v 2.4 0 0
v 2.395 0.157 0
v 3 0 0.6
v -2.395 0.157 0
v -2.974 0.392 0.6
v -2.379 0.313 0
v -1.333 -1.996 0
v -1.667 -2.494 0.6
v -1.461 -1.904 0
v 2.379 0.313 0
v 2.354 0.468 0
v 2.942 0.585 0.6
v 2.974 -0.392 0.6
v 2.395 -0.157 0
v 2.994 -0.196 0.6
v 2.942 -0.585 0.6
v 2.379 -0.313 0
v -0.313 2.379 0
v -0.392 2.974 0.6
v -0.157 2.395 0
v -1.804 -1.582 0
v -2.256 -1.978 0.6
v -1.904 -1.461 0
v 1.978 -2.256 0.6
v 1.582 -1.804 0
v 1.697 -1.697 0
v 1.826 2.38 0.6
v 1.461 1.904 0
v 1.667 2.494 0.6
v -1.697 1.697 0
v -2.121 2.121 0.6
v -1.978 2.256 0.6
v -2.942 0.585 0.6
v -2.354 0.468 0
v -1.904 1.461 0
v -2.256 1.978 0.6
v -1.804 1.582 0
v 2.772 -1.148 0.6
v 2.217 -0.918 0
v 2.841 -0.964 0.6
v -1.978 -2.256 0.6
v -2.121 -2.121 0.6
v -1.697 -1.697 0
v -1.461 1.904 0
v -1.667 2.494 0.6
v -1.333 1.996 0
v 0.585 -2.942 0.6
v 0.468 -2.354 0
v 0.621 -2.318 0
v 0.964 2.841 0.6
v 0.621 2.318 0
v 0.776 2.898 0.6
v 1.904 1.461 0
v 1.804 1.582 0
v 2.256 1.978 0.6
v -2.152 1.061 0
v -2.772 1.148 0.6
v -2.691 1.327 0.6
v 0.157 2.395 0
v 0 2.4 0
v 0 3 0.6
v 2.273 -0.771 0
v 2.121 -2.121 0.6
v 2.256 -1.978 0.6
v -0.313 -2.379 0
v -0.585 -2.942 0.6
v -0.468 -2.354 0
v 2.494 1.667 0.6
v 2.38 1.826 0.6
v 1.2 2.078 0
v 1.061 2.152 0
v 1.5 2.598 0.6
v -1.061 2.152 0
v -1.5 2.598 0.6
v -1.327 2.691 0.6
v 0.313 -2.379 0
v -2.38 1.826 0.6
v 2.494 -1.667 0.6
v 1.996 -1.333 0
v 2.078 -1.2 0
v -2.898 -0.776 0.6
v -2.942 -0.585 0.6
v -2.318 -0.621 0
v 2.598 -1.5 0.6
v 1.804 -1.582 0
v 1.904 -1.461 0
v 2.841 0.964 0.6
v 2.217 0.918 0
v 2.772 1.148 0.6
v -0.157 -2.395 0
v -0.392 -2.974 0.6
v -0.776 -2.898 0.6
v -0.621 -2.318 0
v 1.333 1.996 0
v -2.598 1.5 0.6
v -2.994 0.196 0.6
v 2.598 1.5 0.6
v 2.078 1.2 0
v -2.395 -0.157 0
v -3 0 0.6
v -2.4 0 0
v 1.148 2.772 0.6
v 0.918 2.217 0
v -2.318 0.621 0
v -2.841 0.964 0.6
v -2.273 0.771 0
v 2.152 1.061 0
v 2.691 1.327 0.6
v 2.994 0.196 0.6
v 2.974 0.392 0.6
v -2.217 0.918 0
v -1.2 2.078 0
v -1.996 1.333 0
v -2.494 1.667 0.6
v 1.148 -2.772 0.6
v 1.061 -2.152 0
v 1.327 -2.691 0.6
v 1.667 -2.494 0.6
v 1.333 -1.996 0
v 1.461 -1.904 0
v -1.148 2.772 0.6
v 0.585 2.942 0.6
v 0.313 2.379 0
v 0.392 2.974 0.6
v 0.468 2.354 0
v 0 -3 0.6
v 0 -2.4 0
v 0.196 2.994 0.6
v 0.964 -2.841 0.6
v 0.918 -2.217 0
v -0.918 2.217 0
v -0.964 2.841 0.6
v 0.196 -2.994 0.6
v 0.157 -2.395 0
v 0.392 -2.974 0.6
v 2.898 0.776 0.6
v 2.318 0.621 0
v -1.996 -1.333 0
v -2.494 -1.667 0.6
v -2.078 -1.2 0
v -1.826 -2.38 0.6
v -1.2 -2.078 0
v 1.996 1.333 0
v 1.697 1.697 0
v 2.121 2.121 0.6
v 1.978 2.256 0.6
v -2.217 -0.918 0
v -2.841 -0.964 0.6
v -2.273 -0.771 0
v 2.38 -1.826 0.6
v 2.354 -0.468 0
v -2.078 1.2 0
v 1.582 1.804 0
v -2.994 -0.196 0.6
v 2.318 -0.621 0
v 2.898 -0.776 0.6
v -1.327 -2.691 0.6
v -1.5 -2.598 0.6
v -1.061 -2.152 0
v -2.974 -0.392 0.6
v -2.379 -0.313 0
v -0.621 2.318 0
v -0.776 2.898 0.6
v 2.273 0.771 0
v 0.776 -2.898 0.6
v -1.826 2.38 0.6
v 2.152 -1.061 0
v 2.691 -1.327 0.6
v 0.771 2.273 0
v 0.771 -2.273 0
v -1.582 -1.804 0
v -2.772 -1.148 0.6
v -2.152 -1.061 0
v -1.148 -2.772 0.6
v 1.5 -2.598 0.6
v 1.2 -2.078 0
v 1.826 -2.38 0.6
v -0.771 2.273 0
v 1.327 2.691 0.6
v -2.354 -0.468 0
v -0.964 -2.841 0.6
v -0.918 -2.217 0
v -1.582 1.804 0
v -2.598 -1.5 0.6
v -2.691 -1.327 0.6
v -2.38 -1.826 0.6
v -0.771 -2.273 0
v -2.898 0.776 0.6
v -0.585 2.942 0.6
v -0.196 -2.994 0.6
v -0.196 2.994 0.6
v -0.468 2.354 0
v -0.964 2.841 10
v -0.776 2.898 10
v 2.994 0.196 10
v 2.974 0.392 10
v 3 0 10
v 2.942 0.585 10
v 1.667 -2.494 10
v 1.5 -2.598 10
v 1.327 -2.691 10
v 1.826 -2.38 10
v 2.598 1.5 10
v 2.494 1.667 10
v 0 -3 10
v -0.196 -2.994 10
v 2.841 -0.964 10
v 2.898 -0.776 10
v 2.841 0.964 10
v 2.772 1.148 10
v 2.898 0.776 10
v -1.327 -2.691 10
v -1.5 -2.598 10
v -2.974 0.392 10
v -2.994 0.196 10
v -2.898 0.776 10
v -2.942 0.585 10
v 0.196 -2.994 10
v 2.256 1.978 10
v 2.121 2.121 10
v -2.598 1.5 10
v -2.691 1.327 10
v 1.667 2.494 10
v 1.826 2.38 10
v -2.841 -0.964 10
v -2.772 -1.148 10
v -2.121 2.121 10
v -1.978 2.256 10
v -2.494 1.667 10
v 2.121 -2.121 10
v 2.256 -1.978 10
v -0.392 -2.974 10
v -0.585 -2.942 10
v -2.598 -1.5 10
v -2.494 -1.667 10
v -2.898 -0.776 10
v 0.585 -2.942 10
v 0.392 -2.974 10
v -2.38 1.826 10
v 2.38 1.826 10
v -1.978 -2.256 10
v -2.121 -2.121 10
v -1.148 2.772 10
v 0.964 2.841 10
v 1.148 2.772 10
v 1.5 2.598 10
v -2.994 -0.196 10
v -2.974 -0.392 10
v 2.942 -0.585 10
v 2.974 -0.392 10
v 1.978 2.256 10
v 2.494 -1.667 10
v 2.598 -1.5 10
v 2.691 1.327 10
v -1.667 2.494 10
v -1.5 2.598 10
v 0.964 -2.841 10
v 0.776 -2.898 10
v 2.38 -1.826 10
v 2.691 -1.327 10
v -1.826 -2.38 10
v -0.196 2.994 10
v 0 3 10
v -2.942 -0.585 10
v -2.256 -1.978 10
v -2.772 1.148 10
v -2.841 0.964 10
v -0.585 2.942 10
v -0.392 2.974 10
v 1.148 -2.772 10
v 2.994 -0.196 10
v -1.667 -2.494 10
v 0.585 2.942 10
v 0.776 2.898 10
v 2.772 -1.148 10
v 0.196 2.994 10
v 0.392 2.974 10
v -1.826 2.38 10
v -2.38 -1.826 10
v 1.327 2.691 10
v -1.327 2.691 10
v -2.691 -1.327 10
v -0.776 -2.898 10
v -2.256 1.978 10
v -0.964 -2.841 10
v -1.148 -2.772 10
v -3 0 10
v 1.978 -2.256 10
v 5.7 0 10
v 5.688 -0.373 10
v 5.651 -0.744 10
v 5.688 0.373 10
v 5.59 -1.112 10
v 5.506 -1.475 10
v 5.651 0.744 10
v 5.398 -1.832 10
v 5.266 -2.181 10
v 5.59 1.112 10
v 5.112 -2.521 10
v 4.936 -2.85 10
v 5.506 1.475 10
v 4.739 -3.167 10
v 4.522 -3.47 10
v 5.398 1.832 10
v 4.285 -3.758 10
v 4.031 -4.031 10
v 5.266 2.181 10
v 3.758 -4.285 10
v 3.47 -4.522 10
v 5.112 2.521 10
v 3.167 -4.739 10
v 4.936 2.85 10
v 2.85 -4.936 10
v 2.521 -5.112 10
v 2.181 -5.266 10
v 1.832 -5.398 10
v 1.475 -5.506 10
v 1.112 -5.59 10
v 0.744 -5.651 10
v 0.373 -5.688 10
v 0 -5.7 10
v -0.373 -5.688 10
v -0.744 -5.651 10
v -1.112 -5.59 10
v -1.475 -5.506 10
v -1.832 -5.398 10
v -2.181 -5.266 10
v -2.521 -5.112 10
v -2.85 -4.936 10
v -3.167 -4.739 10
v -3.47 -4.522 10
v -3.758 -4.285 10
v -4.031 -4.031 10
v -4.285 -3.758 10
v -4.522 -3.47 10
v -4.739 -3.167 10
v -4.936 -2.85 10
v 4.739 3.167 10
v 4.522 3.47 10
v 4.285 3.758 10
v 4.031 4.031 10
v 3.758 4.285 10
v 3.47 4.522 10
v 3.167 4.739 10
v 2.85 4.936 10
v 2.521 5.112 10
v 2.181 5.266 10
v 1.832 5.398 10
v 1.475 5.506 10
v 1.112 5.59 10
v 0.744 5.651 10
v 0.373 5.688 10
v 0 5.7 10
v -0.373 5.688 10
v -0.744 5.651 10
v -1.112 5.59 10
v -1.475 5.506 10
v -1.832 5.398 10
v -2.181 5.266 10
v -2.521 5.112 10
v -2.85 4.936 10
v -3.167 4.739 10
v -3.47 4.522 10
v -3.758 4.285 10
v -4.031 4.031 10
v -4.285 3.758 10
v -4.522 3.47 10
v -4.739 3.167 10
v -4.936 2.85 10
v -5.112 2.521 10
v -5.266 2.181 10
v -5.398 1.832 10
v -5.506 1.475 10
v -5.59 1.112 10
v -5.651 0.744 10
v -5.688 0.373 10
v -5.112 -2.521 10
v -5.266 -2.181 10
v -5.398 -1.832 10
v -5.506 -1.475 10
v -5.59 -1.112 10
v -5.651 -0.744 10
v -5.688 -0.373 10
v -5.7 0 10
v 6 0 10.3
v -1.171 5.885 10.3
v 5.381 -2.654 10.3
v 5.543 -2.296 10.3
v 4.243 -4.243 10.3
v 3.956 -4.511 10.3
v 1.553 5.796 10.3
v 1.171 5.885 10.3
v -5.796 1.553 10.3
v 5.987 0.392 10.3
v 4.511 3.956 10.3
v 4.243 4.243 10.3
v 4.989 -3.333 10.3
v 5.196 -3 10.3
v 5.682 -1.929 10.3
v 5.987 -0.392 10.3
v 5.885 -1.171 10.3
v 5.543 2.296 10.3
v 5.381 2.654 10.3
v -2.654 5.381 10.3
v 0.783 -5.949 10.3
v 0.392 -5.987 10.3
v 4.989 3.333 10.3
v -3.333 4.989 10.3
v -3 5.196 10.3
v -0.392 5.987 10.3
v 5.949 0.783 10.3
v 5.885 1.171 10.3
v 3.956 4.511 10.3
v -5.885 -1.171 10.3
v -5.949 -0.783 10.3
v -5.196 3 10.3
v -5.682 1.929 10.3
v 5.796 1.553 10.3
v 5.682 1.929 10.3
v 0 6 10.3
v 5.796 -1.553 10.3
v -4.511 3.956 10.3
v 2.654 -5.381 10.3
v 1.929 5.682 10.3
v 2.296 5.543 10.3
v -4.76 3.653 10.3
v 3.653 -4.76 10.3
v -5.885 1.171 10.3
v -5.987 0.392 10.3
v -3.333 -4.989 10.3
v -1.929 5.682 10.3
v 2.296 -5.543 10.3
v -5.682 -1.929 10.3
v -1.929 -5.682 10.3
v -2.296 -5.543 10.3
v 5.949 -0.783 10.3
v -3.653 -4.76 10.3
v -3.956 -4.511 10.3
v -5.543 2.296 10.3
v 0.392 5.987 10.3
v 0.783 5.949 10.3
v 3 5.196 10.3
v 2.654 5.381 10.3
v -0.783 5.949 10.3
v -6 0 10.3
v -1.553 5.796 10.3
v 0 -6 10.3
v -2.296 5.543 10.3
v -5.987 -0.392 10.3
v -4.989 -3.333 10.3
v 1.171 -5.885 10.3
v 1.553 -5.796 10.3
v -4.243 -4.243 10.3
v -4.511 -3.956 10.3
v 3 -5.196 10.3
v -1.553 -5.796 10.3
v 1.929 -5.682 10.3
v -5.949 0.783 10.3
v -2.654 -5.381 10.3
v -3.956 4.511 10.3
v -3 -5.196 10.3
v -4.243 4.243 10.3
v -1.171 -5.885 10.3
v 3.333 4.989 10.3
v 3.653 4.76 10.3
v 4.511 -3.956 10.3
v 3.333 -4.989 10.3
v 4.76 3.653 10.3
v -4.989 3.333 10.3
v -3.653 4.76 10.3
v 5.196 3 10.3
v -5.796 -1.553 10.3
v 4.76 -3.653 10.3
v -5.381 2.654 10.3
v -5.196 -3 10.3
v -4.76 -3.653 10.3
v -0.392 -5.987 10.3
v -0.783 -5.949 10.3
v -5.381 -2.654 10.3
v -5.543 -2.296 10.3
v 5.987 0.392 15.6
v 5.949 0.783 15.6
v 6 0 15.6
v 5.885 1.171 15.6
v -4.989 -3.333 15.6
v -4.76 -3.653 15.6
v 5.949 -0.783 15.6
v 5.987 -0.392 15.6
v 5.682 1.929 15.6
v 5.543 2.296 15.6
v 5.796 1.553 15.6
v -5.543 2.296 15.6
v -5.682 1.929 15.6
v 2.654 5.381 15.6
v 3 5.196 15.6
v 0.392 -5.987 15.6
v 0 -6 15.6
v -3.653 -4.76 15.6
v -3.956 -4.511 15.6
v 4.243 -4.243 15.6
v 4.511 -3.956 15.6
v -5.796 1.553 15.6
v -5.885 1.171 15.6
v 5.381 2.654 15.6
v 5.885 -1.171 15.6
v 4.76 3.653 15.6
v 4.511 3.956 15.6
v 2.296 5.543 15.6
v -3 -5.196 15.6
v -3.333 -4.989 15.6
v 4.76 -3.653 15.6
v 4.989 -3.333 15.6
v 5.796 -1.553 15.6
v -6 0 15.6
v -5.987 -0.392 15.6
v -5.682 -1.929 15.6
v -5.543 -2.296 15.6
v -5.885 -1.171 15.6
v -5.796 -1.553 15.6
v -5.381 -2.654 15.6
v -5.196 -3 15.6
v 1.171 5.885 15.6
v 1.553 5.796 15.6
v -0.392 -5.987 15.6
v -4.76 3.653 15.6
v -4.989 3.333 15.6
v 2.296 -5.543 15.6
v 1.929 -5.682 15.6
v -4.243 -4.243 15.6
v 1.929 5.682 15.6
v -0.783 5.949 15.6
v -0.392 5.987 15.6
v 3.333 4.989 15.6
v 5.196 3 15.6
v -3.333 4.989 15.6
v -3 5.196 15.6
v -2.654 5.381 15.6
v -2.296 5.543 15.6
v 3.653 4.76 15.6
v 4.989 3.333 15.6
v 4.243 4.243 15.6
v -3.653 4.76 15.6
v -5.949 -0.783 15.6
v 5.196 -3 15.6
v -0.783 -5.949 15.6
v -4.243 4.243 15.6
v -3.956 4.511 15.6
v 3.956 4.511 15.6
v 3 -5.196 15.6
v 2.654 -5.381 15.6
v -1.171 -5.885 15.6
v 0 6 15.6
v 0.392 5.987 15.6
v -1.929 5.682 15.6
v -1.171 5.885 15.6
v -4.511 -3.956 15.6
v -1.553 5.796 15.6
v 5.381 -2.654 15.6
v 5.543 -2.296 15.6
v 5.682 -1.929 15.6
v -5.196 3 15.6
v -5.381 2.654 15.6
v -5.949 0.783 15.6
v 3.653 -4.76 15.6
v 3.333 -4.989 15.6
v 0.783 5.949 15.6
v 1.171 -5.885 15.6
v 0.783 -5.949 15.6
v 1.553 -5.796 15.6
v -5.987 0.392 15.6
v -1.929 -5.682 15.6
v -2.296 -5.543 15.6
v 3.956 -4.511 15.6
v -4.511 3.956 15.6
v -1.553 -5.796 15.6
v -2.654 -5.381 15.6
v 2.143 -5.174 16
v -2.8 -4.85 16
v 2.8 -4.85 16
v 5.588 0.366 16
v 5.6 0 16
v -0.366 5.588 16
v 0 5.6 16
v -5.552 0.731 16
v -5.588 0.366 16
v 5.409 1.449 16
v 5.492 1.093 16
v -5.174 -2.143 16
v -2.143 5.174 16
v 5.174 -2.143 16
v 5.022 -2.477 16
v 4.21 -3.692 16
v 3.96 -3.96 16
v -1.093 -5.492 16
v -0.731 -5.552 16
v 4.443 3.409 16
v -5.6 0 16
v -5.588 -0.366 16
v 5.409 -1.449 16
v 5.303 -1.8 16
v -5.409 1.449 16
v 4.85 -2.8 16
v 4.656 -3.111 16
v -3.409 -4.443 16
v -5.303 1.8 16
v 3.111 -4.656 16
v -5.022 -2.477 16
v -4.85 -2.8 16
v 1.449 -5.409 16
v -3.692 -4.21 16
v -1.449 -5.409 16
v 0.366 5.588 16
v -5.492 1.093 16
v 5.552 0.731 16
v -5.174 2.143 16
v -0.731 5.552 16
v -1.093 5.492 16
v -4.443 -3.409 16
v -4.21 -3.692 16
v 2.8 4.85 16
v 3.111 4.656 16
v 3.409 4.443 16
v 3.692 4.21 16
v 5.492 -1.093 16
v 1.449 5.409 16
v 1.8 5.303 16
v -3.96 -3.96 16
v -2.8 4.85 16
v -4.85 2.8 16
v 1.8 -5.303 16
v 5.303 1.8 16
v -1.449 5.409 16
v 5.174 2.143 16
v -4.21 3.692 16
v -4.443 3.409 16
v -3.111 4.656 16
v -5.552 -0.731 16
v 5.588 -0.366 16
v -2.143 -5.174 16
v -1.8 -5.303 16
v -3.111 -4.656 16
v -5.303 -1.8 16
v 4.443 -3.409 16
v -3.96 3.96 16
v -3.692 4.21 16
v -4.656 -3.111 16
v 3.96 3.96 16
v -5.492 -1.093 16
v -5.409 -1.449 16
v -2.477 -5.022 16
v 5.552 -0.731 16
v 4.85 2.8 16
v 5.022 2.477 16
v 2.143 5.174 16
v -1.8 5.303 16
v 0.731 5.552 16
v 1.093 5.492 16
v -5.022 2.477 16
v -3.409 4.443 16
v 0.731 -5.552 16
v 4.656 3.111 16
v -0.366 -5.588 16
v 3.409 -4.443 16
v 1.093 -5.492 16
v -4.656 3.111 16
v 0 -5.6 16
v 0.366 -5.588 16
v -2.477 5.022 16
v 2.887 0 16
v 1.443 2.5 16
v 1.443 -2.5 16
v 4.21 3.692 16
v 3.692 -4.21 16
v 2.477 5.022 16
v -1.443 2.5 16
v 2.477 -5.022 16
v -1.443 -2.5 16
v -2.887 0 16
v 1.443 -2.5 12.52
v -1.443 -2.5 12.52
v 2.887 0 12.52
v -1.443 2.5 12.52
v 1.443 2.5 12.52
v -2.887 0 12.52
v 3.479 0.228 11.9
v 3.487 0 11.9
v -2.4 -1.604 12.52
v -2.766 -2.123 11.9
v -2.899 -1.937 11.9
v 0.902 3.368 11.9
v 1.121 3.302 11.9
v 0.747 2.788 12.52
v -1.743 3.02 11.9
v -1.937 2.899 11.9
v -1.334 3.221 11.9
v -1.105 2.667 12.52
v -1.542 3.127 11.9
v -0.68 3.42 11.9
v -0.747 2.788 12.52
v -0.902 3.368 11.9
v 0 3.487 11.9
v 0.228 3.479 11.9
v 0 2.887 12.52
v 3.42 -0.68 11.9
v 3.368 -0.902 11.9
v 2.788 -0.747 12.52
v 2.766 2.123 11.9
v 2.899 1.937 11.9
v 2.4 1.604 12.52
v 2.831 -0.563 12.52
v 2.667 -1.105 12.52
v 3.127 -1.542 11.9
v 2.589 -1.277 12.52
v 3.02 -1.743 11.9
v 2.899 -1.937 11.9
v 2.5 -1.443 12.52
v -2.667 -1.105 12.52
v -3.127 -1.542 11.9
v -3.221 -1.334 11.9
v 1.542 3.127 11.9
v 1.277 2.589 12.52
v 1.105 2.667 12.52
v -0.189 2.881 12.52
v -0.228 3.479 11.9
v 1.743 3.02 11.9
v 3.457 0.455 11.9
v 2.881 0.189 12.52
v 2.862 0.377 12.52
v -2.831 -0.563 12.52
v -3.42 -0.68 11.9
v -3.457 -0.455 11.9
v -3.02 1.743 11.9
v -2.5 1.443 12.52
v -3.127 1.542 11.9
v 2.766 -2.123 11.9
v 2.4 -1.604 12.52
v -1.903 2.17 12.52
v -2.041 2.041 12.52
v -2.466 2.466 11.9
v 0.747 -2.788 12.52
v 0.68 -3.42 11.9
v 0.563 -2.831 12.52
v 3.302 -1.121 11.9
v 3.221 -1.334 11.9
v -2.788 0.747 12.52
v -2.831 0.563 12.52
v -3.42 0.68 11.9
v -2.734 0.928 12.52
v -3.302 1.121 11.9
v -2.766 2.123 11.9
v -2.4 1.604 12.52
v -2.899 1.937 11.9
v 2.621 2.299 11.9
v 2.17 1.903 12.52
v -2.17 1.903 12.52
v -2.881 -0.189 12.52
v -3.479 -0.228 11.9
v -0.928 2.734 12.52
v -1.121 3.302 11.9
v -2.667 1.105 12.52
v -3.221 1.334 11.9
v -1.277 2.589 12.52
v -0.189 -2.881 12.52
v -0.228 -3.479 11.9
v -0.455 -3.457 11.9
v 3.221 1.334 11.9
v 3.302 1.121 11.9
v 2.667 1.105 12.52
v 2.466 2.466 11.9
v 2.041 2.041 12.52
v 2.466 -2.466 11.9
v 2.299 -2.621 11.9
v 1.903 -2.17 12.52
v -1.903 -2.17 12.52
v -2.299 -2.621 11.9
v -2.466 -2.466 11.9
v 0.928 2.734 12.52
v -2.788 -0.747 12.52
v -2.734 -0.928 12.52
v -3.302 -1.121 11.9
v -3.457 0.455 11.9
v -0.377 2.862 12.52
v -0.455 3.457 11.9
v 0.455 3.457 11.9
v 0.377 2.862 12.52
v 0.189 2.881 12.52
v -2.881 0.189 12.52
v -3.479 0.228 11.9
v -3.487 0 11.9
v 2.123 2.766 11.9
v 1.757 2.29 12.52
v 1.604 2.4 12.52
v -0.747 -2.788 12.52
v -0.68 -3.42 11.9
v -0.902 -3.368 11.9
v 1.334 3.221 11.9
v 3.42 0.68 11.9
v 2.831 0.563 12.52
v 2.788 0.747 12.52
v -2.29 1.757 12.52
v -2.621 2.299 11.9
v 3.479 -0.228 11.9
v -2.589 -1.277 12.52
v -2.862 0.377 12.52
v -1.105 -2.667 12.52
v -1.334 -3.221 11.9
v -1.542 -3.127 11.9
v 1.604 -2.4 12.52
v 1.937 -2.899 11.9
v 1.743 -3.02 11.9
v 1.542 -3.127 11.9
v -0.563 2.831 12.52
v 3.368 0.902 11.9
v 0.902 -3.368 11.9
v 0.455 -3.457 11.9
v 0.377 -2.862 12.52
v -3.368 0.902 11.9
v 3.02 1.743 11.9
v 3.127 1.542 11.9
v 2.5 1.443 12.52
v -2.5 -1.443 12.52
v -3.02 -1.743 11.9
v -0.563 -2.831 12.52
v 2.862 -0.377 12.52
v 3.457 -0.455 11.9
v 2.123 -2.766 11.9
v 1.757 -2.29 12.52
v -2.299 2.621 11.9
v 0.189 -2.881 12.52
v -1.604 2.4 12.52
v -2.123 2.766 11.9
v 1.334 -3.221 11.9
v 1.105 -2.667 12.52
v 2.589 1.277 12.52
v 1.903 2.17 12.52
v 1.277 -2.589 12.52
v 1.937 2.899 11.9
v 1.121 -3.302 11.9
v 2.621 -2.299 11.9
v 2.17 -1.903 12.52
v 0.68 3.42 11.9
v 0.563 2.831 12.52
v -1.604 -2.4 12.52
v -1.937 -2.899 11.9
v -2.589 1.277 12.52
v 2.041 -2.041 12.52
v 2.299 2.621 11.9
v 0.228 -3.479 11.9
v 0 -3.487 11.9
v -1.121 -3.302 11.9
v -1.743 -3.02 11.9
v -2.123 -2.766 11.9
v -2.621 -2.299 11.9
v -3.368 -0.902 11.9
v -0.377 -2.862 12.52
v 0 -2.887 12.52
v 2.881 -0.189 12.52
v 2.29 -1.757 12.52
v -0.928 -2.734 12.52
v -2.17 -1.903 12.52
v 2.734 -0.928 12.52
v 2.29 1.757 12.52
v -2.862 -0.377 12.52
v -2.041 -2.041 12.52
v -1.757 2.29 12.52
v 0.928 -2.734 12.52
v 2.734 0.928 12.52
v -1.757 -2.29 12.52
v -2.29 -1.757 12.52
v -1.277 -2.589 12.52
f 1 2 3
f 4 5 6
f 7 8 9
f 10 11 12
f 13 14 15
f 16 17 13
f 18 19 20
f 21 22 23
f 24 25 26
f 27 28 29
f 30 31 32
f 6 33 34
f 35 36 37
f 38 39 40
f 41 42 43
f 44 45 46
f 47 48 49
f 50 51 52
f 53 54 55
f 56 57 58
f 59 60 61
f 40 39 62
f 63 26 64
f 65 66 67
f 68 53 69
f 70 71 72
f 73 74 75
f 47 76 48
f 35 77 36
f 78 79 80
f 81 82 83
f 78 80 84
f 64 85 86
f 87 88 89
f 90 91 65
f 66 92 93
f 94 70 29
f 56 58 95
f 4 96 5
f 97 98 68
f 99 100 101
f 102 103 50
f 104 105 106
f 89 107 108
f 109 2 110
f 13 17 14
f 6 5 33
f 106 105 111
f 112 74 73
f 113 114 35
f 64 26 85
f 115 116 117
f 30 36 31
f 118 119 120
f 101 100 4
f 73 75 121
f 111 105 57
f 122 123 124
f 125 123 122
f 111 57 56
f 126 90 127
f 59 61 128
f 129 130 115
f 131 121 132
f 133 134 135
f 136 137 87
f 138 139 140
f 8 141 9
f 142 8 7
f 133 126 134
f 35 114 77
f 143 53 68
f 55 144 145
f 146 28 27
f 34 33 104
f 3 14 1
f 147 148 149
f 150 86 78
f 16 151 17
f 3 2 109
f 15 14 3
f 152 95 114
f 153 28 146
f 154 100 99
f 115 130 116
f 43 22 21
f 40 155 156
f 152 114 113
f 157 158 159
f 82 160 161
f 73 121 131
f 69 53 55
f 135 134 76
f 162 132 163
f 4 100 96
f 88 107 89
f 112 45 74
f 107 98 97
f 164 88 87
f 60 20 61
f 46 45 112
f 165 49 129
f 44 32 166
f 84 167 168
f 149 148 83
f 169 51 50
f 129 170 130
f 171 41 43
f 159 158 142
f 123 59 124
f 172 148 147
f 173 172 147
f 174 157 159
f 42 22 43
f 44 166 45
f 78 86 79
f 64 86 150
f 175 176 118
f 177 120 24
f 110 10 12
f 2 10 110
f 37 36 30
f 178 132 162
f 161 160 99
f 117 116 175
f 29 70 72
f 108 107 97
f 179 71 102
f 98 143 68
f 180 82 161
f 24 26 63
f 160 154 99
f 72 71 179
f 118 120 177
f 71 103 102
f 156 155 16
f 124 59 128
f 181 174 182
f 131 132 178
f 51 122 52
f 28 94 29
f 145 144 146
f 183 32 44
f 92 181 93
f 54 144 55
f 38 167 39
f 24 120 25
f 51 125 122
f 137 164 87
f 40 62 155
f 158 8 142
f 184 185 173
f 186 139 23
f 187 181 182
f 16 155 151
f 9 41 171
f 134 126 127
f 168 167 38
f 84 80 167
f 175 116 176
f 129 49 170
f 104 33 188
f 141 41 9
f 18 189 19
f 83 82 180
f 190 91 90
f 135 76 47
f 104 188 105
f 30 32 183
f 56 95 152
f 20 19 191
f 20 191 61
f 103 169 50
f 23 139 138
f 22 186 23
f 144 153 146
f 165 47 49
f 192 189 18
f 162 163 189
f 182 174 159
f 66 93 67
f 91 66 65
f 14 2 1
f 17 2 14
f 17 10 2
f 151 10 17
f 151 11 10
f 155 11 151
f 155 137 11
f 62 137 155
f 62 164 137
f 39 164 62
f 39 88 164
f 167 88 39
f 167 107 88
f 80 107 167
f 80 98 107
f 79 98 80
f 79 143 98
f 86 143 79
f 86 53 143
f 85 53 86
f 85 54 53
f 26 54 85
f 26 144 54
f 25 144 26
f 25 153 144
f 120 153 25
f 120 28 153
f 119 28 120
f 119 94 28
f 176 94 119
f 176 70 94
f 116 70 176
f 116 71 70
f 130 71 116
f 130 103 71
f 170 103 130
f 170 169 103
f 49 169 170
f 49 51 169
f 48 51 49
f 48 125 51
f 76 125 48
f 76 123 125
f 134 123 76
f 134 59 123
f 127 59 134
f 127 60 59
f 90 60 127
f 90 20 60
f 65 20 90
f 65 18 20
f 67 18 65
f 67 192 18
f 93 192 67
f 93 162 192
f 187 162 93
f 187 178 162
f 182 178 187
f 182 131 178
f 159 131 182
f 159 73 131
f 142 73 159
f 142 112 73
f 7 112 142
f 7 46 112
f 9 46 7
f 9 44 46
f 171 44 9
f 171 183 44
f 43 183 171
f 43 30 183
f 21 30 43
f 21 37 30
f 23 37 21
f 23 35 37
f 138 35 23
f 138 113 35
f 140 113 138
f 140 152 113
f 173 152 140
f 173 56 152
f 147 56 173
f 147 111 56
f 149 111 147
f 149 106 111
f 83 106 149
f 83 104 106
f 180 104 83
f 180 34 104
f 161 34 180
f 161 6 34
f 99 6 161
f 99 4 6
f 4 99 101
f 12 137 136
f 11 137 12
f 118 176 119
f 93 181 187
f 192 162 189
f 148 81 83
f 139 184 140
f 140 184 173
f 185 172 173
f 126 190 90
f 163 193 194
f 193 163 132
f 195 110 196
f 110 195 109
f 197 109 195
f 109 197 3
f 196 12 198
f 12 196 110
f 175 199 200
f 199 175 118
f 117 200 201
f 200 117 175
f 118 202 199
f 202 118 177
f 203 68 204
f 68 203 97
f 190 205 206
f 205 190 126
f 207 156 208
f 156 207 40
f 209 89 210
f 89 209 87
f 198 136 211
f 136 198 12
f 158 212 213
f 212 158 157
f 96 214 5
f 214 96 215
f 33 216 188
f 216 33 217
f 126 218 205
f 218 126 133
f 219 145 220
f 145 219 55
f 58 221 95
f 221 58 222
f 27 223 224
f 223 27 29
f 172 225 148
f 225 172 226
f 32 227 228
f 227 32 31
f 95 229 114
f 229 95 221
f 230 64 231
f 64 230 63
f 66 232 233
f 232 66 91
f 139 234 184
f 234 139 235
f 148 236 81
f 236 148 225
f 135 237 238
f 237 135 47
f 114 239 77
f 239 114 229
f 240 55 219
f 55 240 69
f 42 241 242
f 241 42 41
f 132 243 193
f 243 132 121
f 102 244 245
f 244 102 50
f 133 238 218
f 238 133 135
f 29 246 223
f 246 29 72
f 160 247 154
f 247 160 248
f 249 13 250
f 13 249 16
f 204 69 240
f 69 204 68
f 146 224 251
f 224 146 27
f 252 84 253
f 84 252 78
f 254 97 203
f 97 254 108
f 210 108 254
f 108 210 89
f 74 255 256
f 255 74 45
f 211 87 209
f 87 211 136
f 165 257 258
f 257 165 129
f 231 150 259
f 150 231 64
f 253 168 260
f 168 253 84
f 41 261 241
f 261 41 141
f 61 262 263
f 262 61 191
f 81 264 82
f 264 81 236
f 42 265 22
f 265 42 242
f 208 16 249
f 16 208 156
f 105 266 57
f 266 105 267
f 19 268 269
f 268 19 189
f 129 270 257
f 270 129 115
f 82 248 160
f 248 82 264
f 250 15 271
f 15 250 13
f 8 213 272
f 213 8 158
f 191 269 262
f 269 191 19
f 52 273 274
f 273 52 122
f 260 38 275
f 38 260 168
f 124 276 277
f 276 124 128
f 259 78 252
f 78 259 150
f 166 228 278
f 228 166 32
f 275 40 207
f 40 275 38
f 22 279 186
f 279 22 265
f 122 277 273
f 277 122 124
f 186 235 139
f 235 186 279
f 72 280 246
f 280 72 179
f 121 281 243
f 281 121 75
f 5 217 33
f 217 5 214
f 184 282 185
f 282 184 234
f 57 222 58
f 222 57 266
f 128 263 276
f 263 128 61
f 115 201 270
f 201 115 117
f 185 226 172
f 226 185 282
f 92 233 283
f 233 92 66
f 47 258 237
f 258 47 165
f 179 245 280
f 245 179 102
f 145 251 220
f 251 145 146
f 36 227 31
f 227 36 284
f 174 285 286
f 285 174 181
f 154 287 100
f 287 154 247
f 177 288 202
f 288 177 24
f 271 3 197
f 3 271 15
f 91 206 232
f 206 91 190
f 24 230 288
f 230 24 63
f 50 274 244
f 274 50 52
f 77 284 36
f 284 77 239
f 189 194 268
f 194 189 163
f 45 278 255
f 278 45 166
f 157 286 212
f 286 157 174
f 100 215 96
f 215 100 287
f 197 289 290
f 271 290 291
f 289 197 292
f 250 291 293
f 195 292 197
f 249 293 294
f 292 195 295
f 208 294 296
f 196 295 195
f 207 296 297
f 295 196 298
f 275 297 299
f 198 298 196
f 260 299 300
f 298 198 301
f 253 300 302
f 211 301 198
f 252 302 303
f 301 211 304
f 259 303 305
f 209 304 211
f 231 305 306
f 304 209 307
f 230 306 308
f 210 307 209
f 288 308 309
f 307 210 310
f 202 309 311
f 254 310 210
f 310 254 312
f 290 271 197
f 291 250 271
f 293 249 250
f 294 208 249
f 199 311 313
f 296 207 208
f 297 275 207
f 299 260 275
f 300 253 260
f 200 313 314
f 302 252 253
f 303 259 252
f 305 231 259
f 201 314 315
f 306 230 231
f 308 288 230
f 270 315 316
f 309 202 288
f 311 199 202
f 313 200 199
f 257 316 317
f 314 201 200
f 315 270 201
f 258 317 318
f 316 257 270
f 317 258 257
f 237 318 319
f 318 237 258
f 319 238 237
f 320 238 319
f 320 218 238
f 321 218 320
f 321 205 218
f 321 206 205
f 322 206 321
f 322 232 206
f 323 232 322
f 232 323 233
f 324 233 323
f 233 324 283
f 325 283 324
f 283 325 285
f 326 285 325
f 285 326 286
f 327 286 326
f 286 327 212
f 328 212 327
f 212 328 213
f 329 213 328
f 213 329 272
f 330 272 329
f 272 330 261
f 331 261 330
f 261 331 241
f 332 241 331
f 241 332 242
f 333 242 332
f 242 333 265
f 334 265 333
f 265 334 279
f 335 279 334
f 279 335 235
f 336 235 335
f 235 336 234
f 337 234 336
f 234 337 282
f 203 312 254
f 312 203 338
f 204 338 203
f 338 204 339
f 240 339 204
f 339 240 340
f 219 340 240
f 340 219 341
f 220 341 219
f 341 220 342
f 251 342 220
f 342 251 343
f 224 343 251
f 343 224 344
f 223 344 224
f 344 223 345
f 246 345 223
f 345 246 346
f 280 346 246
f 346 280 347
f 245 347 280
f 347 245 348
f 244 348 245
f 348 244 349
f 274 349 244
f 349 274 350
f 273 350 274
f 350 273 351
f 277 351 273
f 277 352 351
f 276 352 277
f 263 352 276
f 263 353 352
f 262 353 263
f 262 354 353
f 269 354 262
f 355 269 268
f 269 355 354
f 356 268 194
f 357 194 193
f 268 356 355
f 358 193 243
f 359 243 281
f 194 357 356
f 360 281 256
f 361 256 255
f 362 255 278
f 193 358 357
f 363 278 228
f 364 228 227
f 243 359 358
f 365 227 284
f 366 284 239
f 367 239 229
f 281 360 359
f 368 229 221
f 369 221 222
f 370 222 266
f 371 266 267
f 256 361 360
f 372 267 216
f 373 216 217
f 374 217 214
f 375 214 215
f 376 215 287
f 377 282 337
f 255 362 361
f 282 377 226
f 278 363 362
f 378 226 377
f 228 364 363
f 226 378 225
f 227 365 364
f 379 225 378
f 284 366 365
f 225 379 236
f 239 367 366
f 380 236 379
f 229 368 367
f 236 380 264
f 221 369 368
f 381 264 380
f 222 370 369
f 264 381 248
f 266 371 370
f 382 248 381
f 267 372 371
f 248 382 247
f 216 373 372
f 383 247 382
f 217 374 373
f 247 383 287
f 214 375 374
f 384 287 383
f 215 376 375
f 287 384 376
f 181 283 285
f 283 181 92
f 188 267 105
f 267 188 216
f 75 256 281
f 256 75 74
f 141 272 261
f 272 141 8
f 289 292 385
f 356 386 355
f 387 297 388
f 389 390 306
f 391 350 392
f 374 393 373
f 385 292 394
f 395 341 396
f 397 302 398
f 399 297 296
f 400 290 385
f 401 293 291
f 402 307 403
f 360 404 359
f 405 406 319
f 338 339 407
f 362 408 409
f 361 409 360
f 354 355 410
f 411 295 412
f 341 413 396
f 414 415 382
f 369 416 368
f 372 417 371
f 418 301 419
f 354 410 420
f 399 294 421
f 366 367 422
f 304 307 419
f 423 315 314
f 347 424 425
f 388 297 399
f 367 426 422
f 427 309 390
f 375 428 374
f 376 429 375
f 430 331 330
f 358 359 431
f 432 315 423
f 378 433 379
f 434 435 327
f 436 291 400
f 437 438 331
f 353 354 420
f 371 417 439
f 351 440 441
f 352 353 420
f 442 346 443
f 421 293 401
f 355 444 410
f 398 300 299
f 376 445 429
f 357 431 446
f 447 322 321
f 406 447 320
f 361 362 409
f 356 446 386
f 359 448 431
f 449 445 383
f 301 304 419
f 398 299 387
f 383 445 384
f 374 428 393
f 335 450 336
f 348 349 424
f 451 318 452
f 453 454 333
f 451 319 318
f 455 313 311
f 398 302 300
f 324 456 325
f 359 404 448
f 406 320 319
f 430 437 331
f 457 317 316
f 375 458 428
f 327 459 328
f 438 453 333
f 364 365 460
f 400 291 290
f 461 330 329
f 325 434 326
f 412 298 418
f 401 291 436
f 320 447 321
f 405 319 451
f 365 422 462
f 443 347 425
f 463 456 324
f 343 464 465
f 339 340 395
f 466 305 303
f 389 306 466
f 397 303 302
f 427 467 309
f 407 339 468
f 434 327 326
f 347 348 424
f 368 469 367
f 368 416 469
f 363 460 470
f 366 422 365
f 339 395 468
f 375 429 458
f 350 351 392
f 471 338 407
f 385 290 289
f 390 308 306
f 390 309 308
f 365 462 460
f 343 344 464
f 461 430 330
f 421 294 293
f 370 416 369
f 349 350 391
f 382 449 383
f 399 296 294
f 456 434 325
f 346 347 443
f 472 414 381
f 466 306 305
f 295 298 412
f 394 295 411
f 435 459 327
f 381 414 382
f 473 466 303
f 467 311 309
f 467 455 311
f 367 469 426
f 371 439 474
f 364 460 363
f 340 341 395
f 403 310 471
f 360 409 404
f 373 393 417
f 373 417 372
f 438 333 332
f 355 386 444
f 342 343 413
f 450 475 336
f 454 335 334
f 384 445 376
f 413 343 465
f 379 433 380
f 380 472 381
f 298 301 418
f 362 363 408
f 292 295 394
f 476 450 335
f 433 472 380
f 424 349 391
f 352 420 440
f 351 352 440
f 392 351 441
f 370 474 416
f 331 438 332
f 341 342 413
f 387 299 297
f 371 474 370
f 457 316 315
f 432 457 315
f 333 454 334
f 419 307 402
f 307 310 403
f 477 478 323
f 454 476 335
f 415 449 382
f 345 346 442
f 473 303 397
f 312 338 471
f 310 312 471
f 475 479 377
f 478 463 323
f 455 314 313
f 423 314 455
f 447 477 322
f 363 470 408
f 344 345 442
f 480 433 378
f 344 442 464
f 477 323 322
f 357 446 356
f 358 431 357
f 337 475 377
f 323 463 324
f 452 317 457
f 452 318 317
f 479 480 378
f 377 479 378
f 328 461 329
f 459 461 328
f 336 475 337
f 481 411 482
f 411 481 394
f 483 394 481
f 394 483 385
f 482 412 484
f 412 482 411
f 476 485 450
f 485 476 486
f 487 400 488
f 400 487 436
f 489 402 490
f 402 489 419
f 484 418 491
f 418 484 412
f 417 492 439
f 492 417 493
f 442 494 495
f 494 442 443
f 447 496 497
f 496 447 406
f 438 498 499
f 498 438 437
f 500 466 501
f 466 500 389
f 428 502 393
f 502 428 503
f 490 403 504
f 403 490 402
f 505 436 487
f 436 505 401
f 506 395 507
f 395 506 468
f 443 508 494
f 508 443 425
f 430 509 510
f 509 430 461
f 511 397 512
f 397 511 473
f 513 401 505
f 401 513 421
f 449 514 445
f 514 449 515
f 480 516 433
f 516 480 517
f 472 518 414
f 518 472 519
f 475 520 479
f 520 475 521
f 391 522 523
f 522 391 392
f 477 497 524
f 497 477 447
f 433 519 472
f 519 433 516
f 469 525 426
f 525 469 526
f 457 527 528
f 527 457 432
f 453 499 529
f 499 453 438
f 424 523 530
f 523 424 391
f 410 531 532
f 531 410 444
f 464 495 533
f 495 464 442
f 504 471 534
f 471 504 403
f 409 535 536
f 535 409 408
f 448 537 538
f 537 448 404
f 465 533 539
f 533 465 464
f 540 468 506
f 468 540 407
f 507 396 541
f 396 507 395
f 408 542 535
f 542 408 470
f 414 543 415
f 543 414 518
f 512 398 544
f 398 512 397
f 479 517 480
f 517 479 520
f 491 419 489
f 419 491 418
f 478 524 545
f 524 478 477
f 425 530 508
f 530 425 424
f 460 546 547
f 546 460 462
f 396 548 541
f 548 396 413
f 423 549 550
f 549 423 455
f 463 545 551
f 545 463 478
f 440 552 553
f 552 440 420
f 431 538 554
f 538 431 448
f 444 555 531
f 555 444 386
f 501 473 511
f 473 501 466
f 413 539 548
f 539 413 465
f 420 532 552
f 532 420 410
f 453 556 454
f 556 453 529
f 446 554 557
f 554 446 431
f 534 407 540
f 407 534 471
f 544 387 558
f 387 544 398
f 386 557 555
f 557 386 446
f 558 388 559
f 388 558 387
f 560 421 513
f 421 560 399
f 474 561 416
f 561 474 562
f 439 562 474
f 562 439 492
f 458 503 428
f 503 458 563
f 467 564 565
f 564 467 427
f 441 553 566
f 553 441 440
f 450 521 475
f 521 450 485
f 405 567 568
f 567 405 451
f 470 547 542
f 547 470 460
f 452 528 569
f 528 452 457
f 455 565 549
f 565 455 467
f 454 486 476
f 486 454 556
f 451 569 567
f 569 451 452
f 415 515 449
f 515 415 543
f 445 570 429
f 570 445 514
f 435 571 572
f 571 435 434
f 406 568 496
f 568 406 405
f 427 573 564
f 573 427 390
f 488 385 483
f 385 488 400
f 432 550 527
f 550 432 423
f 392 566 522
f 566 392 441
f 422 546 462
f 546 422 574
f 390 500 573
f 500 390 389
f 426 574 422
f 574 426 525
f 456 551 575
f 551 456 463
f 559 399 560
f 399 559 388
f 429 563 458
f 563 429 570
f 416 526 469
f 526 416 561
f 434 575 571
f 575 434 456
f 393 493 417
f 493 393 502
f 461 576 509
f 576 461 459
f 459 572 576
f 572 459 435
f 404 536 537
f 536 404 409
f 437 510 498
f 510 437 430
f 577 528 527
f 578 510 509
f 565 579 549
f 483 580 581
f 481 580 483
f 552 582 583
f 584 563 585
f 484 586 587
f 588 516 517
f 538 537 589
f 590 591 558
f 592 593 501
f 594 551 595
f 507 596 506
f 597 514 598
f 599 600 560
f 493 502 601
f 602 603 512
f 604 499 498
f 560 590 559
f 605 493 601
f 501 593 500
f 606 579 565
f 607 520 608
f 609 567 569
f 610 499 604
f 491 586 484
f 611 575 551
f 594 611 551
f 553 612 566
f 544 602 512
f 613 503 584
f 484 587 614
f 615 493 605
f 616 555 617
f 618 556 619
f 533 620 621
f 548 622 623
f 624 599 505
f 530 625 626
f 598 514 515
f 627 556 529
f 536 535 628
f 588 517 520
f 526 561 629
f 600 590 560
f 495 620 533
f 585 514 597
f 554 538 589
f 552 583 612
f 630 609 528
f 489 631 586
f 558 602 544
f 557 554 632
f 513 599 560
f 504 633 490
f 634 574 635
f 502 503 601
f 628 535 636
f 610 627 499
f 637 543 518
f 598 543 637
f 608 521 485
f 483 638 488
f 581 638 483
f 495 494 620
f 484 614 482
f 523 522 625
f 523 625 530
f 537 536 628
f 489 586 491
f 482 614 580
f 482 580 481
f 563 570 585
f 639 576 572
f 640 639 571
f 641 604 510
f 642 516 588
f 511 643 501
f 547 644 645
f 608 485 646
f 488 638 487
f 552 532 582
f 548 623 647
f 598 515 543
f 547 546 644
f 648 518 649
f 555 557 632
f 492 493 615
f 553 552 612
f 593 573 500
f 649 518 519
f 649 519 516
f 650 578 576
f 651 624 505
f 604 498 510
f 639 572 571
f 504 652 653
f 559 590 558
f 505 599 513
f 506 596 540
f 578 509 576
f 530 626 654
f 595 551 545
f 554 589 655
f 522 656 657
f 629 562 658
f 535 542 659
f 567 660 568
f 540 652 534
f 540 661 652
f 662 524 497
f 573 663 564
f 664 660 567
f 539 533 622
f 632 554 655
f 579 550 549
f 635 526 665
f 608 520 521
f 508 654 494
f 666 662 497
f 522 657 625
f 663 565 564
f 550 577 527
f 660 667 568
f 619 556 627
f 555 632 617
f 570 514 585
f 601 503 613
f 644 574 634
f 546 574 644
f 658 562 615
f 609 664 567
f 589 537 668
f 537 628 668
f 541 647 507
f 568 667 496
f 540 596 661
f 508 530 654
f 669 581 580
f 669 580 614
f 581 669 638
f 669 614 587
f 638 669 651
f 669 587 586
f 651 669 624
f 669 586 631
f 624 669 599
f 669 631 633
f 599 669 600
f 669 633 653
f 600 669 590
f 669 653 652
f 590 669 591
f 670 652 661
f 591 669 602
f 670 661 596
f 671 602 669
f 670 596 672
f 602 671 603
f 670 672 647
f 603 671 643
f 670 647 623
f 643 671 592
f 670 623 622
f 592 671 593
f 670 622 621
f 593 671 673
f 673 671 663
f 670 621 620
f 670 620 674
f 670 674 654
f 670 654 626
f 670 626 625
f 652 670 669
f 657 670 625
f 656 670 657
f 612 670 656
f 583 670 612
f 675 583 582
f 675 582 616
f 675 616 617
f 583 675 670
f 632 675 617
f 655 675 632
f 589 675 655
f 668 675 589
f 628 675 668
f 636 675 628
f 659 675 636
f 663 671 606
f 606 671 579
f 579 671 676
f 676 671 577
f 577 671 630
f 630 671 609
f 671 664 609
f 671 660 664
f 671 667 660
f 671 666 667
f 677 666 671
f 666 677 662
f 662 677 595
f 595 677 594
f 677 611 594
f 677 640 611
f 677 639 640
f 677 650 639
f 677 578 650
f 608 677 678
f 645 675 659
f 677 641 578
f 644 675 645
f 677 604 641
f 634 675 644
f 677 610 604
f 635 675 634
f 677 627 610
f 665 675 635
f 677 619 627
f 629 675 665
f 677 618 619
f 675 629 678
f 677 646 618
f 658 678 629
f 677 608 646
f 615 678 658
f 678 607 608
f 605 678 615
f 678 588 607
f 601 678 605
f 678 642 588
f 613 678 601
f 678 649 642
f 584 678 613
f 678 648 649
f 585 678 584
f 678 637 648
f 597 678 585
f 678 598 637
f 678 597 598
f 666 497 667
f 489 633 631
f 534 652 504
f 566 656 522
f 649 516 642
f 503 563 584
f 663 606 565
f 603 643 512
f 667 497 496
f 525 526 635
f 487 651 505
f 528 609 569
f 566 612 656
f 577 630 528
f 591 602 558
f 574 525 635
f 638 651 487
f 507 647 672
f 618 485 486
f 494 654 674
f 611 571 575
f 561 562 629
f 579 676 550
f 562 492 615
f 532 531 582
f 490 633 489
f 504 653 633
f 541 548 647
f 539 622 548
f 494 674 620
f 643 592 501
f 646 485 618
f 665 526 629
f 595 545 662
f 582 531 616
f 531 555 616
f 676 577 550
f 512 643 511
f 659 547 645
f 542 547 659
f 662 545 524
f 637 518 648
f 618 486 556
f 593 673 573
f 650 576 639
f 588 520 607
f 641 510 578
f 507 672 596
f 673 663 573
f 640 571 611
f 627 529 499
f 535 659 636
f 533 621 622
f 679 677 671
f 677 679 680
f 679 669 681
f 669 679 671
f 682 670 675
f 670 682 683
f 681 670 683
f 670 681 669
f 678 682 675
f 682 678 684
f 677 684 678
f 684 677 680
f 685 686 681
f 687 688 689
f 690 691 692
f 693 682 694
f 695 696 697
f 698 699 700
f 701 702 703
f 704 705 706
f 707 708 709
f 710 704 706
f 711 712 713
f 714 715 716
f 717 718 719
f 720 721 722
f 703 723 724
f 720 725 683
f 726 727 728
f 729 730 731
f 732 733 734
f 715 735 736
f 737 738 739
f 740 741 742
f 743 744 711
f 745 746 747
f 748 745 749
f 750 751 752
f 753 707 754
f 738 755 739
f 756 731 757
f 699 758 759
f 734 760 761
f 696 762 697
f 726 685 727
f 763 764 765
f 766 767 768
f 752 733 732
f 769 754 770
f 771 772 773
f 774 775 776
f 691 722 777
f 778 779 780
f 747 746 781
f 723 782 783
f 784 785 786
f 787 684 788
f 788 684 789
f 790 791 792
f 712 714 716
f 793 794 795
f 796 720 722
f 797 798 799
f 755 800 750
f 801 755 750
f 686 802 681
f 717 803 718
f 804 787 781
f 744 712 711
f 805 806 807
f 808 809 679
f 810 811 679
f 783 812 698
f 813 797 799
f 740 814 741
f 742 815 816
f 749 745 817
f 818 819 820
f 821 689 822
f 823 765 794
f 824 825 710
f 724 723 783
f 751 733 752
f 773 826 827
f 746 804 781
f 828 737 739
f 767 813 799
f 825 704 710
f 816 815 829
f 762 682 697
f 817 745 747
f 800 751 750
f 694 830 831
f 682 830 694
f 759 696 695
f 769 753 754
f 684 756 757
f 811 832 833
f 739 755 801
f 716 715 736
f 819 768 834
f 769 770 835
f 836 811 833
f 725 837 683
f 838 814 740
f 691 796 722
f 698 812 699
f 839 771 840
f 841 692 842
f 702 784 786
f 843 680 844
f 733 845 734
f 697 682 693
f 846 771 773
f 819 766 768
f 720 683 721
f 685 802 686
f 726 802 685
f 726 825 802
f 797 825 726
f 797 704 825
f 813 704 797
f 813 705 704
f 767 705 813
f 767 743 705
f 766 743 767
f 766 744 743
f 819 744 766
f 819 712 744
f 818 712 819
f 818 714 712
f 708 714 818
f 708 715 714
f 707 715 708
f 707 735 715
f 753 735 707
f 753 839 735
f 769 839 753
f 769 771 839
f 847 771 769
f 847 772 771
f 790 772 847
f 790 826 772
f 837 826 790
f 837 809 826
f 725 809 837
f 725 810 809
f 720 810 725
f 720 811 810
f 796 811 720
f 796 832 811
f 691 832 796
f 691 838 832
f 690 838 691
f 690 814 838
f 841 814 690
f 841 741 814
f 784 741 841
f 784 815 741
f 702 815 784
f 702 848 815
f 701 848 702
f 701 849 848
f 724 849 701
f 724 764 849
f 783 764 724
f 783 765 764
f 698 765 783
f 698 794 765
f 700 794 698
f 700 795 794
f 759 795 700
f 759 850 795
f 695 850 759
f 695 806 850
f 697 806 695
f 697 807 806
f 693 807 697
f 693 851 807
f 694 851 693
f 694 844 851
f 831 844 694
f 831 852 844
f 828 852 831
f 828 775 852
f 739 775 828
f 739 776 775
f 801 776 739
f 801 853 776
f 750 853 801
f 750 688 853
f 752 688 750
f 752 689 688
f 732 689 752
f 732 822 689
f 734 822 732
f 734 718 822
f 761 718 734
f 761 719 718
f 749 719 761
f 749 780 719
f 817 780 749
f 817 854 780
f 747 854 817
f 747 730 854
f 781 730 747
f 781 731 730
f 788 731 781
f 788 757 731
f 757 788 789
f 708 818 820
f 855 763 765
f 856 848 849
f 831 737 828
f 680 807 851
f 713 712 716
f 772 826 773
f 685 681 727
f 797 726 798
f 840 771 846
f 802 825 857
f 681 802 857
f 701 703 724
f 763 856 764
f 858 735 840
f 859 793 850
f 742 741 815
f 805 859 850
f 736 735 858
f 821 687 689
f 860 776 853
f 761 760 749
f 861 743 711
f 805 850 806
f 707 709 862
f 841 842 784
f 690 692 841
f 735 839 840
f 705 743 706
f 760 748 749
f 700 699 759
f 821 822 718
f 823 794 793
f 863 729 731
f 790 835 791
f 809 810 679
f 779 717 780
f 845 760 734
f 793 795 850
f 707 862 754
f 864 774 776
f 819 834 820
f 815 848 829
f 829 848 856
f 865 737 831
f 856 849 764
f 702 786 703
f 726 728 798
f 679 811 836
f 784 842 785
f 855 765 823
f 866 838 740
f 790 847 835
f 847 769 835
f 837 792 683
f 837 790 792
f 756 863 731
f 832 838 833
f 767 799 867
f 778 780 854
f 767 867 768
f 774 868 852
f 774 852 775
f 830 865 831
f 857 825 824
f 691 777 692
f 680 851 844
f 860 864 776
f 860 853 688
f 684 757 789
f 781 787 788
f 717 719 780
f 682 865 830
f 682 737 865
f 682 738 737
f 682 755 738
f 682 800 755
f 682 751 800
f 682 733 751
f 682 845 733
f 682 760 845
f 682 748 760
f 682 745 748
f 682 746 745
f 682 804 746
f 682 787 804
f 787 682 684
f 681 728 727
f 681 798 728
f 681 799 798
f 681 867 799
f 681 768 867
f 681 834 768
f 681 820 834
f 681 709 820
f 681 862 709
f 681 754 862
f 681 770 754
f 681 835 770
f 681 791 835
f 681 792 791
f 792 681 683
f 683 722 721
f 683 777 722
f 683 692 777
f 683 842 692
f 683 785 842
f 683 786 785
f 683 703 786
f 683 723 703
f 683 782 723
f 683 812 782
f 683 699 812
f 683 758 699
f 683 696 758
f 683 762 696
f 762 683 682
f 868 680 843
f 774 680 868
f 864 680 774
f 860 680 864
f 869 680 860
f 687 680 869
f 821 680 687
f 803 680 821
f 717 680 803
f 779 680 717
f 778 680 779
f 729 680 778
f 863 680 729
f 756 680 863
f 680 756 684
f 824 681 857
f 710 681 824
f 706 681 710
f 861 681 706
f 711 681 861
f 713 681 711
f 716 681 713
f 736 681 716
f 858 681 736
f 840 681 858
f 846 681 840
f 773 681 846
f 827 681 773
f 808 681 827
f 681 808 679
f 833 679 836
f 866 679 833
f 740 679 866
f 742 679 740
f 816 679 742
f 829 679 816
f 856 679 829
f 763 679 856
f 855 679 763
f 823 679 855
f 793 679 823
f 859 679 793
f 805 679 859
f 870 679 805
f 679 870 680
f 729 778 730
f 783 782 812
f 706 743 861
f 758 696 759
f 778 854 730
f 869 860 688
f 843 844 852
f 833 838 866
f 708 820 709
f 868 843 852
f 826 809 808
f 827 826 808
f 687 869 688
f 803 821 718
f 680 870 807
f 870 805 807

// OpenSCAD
$fn = 96;

// Socket Head Cap Screw (approx. ISO 4762 / DIN 912 style)
// Given: shank diameter = 6.0 mm, head diameter = 12.0 mm, length under head = 10 mm

d_shank = 6.0;
L = 10.0;

d_head = 12.0;
h_head = 6.0;          // typical for M6 SHCS

// Hex socket (approx for M6)
socket_af = 5.0;       // across flats
socket_depth = 3.5;
socket_entry_chamfer = 0.6;

// Small edge chamfers
head_top_chamfer = 0.4;
head_bottom_chamfer = 0.3;
shank_tip_chamfer = 0.6;

module hex_prism(af, h) {
    // Regular hex with across-flats = af
    r = af / sqrt(3); // circumradius
    cylinder(h=h, r=r, $fn=6);
}

module chamfered_cylinder(h, d, chamfer_top=0, chamfer_bottom=0) {
    // Creates a cylinder with optional 45-ish chamfers by using tapered sections
    // chamfer values are axial heights of the chamfer sections.
    d0 = d;
    d_top = max(0, d0 - 2*chamfer_top);
    d_bot = max(0, d0 - 2*chamfer_bottom);

    union() {
        // bottom chamfer
        if (chamfer_bottom > 0)
            cylinder(h=chamfer_bottom, d1=d_bot, d2=d0);

        // middle straight
        mid_h = h - chamfer_top - chamfer_bottom;
        if (mid_h > 0)
            translate([0,0,chamfer_bottom])
                cylinder(h=mid_h, d=d0);

        // top chamfer
        if (chamfer_top > 0)
            translate([0,0,h - chamfer_top])
                cylinder(h=chamfer_top, d1=d0, d2=d_top);
    }
}

difference() {
    union() {
        // Shank (unthreaded for simplicity)
        translate([0,0,0])
            chamfered_cylinder(h=L, d=d_shank, chamfer_top=0, chamfer_bottom=shank_tip_chamfer);

        // Head
        translate([0,0,L])
            chamfered_cylinder(h=h_head, d=d_head, chamfer_top=head_top_chamfer, chamfer_bottom=head_bottom_chamfer);
    }

    // Hex socket cut
    translate([0,0,L + h_head - socket_depth])
        hex_prism(socket_af, socket_depth + 0.01);

    // Socket entry chamfer (slight countersink)
    translate([0,0,L + h_head - socket_depth - socket_entry_chamfer])
        cylinder(h=socket_entry_chamfer + 0.02,
                 d1=(socket_af / sqrt(3))*2 + 2*socket_entry_chamfer,
                 d2=(socket_af / sqrt(3))*2);
}
